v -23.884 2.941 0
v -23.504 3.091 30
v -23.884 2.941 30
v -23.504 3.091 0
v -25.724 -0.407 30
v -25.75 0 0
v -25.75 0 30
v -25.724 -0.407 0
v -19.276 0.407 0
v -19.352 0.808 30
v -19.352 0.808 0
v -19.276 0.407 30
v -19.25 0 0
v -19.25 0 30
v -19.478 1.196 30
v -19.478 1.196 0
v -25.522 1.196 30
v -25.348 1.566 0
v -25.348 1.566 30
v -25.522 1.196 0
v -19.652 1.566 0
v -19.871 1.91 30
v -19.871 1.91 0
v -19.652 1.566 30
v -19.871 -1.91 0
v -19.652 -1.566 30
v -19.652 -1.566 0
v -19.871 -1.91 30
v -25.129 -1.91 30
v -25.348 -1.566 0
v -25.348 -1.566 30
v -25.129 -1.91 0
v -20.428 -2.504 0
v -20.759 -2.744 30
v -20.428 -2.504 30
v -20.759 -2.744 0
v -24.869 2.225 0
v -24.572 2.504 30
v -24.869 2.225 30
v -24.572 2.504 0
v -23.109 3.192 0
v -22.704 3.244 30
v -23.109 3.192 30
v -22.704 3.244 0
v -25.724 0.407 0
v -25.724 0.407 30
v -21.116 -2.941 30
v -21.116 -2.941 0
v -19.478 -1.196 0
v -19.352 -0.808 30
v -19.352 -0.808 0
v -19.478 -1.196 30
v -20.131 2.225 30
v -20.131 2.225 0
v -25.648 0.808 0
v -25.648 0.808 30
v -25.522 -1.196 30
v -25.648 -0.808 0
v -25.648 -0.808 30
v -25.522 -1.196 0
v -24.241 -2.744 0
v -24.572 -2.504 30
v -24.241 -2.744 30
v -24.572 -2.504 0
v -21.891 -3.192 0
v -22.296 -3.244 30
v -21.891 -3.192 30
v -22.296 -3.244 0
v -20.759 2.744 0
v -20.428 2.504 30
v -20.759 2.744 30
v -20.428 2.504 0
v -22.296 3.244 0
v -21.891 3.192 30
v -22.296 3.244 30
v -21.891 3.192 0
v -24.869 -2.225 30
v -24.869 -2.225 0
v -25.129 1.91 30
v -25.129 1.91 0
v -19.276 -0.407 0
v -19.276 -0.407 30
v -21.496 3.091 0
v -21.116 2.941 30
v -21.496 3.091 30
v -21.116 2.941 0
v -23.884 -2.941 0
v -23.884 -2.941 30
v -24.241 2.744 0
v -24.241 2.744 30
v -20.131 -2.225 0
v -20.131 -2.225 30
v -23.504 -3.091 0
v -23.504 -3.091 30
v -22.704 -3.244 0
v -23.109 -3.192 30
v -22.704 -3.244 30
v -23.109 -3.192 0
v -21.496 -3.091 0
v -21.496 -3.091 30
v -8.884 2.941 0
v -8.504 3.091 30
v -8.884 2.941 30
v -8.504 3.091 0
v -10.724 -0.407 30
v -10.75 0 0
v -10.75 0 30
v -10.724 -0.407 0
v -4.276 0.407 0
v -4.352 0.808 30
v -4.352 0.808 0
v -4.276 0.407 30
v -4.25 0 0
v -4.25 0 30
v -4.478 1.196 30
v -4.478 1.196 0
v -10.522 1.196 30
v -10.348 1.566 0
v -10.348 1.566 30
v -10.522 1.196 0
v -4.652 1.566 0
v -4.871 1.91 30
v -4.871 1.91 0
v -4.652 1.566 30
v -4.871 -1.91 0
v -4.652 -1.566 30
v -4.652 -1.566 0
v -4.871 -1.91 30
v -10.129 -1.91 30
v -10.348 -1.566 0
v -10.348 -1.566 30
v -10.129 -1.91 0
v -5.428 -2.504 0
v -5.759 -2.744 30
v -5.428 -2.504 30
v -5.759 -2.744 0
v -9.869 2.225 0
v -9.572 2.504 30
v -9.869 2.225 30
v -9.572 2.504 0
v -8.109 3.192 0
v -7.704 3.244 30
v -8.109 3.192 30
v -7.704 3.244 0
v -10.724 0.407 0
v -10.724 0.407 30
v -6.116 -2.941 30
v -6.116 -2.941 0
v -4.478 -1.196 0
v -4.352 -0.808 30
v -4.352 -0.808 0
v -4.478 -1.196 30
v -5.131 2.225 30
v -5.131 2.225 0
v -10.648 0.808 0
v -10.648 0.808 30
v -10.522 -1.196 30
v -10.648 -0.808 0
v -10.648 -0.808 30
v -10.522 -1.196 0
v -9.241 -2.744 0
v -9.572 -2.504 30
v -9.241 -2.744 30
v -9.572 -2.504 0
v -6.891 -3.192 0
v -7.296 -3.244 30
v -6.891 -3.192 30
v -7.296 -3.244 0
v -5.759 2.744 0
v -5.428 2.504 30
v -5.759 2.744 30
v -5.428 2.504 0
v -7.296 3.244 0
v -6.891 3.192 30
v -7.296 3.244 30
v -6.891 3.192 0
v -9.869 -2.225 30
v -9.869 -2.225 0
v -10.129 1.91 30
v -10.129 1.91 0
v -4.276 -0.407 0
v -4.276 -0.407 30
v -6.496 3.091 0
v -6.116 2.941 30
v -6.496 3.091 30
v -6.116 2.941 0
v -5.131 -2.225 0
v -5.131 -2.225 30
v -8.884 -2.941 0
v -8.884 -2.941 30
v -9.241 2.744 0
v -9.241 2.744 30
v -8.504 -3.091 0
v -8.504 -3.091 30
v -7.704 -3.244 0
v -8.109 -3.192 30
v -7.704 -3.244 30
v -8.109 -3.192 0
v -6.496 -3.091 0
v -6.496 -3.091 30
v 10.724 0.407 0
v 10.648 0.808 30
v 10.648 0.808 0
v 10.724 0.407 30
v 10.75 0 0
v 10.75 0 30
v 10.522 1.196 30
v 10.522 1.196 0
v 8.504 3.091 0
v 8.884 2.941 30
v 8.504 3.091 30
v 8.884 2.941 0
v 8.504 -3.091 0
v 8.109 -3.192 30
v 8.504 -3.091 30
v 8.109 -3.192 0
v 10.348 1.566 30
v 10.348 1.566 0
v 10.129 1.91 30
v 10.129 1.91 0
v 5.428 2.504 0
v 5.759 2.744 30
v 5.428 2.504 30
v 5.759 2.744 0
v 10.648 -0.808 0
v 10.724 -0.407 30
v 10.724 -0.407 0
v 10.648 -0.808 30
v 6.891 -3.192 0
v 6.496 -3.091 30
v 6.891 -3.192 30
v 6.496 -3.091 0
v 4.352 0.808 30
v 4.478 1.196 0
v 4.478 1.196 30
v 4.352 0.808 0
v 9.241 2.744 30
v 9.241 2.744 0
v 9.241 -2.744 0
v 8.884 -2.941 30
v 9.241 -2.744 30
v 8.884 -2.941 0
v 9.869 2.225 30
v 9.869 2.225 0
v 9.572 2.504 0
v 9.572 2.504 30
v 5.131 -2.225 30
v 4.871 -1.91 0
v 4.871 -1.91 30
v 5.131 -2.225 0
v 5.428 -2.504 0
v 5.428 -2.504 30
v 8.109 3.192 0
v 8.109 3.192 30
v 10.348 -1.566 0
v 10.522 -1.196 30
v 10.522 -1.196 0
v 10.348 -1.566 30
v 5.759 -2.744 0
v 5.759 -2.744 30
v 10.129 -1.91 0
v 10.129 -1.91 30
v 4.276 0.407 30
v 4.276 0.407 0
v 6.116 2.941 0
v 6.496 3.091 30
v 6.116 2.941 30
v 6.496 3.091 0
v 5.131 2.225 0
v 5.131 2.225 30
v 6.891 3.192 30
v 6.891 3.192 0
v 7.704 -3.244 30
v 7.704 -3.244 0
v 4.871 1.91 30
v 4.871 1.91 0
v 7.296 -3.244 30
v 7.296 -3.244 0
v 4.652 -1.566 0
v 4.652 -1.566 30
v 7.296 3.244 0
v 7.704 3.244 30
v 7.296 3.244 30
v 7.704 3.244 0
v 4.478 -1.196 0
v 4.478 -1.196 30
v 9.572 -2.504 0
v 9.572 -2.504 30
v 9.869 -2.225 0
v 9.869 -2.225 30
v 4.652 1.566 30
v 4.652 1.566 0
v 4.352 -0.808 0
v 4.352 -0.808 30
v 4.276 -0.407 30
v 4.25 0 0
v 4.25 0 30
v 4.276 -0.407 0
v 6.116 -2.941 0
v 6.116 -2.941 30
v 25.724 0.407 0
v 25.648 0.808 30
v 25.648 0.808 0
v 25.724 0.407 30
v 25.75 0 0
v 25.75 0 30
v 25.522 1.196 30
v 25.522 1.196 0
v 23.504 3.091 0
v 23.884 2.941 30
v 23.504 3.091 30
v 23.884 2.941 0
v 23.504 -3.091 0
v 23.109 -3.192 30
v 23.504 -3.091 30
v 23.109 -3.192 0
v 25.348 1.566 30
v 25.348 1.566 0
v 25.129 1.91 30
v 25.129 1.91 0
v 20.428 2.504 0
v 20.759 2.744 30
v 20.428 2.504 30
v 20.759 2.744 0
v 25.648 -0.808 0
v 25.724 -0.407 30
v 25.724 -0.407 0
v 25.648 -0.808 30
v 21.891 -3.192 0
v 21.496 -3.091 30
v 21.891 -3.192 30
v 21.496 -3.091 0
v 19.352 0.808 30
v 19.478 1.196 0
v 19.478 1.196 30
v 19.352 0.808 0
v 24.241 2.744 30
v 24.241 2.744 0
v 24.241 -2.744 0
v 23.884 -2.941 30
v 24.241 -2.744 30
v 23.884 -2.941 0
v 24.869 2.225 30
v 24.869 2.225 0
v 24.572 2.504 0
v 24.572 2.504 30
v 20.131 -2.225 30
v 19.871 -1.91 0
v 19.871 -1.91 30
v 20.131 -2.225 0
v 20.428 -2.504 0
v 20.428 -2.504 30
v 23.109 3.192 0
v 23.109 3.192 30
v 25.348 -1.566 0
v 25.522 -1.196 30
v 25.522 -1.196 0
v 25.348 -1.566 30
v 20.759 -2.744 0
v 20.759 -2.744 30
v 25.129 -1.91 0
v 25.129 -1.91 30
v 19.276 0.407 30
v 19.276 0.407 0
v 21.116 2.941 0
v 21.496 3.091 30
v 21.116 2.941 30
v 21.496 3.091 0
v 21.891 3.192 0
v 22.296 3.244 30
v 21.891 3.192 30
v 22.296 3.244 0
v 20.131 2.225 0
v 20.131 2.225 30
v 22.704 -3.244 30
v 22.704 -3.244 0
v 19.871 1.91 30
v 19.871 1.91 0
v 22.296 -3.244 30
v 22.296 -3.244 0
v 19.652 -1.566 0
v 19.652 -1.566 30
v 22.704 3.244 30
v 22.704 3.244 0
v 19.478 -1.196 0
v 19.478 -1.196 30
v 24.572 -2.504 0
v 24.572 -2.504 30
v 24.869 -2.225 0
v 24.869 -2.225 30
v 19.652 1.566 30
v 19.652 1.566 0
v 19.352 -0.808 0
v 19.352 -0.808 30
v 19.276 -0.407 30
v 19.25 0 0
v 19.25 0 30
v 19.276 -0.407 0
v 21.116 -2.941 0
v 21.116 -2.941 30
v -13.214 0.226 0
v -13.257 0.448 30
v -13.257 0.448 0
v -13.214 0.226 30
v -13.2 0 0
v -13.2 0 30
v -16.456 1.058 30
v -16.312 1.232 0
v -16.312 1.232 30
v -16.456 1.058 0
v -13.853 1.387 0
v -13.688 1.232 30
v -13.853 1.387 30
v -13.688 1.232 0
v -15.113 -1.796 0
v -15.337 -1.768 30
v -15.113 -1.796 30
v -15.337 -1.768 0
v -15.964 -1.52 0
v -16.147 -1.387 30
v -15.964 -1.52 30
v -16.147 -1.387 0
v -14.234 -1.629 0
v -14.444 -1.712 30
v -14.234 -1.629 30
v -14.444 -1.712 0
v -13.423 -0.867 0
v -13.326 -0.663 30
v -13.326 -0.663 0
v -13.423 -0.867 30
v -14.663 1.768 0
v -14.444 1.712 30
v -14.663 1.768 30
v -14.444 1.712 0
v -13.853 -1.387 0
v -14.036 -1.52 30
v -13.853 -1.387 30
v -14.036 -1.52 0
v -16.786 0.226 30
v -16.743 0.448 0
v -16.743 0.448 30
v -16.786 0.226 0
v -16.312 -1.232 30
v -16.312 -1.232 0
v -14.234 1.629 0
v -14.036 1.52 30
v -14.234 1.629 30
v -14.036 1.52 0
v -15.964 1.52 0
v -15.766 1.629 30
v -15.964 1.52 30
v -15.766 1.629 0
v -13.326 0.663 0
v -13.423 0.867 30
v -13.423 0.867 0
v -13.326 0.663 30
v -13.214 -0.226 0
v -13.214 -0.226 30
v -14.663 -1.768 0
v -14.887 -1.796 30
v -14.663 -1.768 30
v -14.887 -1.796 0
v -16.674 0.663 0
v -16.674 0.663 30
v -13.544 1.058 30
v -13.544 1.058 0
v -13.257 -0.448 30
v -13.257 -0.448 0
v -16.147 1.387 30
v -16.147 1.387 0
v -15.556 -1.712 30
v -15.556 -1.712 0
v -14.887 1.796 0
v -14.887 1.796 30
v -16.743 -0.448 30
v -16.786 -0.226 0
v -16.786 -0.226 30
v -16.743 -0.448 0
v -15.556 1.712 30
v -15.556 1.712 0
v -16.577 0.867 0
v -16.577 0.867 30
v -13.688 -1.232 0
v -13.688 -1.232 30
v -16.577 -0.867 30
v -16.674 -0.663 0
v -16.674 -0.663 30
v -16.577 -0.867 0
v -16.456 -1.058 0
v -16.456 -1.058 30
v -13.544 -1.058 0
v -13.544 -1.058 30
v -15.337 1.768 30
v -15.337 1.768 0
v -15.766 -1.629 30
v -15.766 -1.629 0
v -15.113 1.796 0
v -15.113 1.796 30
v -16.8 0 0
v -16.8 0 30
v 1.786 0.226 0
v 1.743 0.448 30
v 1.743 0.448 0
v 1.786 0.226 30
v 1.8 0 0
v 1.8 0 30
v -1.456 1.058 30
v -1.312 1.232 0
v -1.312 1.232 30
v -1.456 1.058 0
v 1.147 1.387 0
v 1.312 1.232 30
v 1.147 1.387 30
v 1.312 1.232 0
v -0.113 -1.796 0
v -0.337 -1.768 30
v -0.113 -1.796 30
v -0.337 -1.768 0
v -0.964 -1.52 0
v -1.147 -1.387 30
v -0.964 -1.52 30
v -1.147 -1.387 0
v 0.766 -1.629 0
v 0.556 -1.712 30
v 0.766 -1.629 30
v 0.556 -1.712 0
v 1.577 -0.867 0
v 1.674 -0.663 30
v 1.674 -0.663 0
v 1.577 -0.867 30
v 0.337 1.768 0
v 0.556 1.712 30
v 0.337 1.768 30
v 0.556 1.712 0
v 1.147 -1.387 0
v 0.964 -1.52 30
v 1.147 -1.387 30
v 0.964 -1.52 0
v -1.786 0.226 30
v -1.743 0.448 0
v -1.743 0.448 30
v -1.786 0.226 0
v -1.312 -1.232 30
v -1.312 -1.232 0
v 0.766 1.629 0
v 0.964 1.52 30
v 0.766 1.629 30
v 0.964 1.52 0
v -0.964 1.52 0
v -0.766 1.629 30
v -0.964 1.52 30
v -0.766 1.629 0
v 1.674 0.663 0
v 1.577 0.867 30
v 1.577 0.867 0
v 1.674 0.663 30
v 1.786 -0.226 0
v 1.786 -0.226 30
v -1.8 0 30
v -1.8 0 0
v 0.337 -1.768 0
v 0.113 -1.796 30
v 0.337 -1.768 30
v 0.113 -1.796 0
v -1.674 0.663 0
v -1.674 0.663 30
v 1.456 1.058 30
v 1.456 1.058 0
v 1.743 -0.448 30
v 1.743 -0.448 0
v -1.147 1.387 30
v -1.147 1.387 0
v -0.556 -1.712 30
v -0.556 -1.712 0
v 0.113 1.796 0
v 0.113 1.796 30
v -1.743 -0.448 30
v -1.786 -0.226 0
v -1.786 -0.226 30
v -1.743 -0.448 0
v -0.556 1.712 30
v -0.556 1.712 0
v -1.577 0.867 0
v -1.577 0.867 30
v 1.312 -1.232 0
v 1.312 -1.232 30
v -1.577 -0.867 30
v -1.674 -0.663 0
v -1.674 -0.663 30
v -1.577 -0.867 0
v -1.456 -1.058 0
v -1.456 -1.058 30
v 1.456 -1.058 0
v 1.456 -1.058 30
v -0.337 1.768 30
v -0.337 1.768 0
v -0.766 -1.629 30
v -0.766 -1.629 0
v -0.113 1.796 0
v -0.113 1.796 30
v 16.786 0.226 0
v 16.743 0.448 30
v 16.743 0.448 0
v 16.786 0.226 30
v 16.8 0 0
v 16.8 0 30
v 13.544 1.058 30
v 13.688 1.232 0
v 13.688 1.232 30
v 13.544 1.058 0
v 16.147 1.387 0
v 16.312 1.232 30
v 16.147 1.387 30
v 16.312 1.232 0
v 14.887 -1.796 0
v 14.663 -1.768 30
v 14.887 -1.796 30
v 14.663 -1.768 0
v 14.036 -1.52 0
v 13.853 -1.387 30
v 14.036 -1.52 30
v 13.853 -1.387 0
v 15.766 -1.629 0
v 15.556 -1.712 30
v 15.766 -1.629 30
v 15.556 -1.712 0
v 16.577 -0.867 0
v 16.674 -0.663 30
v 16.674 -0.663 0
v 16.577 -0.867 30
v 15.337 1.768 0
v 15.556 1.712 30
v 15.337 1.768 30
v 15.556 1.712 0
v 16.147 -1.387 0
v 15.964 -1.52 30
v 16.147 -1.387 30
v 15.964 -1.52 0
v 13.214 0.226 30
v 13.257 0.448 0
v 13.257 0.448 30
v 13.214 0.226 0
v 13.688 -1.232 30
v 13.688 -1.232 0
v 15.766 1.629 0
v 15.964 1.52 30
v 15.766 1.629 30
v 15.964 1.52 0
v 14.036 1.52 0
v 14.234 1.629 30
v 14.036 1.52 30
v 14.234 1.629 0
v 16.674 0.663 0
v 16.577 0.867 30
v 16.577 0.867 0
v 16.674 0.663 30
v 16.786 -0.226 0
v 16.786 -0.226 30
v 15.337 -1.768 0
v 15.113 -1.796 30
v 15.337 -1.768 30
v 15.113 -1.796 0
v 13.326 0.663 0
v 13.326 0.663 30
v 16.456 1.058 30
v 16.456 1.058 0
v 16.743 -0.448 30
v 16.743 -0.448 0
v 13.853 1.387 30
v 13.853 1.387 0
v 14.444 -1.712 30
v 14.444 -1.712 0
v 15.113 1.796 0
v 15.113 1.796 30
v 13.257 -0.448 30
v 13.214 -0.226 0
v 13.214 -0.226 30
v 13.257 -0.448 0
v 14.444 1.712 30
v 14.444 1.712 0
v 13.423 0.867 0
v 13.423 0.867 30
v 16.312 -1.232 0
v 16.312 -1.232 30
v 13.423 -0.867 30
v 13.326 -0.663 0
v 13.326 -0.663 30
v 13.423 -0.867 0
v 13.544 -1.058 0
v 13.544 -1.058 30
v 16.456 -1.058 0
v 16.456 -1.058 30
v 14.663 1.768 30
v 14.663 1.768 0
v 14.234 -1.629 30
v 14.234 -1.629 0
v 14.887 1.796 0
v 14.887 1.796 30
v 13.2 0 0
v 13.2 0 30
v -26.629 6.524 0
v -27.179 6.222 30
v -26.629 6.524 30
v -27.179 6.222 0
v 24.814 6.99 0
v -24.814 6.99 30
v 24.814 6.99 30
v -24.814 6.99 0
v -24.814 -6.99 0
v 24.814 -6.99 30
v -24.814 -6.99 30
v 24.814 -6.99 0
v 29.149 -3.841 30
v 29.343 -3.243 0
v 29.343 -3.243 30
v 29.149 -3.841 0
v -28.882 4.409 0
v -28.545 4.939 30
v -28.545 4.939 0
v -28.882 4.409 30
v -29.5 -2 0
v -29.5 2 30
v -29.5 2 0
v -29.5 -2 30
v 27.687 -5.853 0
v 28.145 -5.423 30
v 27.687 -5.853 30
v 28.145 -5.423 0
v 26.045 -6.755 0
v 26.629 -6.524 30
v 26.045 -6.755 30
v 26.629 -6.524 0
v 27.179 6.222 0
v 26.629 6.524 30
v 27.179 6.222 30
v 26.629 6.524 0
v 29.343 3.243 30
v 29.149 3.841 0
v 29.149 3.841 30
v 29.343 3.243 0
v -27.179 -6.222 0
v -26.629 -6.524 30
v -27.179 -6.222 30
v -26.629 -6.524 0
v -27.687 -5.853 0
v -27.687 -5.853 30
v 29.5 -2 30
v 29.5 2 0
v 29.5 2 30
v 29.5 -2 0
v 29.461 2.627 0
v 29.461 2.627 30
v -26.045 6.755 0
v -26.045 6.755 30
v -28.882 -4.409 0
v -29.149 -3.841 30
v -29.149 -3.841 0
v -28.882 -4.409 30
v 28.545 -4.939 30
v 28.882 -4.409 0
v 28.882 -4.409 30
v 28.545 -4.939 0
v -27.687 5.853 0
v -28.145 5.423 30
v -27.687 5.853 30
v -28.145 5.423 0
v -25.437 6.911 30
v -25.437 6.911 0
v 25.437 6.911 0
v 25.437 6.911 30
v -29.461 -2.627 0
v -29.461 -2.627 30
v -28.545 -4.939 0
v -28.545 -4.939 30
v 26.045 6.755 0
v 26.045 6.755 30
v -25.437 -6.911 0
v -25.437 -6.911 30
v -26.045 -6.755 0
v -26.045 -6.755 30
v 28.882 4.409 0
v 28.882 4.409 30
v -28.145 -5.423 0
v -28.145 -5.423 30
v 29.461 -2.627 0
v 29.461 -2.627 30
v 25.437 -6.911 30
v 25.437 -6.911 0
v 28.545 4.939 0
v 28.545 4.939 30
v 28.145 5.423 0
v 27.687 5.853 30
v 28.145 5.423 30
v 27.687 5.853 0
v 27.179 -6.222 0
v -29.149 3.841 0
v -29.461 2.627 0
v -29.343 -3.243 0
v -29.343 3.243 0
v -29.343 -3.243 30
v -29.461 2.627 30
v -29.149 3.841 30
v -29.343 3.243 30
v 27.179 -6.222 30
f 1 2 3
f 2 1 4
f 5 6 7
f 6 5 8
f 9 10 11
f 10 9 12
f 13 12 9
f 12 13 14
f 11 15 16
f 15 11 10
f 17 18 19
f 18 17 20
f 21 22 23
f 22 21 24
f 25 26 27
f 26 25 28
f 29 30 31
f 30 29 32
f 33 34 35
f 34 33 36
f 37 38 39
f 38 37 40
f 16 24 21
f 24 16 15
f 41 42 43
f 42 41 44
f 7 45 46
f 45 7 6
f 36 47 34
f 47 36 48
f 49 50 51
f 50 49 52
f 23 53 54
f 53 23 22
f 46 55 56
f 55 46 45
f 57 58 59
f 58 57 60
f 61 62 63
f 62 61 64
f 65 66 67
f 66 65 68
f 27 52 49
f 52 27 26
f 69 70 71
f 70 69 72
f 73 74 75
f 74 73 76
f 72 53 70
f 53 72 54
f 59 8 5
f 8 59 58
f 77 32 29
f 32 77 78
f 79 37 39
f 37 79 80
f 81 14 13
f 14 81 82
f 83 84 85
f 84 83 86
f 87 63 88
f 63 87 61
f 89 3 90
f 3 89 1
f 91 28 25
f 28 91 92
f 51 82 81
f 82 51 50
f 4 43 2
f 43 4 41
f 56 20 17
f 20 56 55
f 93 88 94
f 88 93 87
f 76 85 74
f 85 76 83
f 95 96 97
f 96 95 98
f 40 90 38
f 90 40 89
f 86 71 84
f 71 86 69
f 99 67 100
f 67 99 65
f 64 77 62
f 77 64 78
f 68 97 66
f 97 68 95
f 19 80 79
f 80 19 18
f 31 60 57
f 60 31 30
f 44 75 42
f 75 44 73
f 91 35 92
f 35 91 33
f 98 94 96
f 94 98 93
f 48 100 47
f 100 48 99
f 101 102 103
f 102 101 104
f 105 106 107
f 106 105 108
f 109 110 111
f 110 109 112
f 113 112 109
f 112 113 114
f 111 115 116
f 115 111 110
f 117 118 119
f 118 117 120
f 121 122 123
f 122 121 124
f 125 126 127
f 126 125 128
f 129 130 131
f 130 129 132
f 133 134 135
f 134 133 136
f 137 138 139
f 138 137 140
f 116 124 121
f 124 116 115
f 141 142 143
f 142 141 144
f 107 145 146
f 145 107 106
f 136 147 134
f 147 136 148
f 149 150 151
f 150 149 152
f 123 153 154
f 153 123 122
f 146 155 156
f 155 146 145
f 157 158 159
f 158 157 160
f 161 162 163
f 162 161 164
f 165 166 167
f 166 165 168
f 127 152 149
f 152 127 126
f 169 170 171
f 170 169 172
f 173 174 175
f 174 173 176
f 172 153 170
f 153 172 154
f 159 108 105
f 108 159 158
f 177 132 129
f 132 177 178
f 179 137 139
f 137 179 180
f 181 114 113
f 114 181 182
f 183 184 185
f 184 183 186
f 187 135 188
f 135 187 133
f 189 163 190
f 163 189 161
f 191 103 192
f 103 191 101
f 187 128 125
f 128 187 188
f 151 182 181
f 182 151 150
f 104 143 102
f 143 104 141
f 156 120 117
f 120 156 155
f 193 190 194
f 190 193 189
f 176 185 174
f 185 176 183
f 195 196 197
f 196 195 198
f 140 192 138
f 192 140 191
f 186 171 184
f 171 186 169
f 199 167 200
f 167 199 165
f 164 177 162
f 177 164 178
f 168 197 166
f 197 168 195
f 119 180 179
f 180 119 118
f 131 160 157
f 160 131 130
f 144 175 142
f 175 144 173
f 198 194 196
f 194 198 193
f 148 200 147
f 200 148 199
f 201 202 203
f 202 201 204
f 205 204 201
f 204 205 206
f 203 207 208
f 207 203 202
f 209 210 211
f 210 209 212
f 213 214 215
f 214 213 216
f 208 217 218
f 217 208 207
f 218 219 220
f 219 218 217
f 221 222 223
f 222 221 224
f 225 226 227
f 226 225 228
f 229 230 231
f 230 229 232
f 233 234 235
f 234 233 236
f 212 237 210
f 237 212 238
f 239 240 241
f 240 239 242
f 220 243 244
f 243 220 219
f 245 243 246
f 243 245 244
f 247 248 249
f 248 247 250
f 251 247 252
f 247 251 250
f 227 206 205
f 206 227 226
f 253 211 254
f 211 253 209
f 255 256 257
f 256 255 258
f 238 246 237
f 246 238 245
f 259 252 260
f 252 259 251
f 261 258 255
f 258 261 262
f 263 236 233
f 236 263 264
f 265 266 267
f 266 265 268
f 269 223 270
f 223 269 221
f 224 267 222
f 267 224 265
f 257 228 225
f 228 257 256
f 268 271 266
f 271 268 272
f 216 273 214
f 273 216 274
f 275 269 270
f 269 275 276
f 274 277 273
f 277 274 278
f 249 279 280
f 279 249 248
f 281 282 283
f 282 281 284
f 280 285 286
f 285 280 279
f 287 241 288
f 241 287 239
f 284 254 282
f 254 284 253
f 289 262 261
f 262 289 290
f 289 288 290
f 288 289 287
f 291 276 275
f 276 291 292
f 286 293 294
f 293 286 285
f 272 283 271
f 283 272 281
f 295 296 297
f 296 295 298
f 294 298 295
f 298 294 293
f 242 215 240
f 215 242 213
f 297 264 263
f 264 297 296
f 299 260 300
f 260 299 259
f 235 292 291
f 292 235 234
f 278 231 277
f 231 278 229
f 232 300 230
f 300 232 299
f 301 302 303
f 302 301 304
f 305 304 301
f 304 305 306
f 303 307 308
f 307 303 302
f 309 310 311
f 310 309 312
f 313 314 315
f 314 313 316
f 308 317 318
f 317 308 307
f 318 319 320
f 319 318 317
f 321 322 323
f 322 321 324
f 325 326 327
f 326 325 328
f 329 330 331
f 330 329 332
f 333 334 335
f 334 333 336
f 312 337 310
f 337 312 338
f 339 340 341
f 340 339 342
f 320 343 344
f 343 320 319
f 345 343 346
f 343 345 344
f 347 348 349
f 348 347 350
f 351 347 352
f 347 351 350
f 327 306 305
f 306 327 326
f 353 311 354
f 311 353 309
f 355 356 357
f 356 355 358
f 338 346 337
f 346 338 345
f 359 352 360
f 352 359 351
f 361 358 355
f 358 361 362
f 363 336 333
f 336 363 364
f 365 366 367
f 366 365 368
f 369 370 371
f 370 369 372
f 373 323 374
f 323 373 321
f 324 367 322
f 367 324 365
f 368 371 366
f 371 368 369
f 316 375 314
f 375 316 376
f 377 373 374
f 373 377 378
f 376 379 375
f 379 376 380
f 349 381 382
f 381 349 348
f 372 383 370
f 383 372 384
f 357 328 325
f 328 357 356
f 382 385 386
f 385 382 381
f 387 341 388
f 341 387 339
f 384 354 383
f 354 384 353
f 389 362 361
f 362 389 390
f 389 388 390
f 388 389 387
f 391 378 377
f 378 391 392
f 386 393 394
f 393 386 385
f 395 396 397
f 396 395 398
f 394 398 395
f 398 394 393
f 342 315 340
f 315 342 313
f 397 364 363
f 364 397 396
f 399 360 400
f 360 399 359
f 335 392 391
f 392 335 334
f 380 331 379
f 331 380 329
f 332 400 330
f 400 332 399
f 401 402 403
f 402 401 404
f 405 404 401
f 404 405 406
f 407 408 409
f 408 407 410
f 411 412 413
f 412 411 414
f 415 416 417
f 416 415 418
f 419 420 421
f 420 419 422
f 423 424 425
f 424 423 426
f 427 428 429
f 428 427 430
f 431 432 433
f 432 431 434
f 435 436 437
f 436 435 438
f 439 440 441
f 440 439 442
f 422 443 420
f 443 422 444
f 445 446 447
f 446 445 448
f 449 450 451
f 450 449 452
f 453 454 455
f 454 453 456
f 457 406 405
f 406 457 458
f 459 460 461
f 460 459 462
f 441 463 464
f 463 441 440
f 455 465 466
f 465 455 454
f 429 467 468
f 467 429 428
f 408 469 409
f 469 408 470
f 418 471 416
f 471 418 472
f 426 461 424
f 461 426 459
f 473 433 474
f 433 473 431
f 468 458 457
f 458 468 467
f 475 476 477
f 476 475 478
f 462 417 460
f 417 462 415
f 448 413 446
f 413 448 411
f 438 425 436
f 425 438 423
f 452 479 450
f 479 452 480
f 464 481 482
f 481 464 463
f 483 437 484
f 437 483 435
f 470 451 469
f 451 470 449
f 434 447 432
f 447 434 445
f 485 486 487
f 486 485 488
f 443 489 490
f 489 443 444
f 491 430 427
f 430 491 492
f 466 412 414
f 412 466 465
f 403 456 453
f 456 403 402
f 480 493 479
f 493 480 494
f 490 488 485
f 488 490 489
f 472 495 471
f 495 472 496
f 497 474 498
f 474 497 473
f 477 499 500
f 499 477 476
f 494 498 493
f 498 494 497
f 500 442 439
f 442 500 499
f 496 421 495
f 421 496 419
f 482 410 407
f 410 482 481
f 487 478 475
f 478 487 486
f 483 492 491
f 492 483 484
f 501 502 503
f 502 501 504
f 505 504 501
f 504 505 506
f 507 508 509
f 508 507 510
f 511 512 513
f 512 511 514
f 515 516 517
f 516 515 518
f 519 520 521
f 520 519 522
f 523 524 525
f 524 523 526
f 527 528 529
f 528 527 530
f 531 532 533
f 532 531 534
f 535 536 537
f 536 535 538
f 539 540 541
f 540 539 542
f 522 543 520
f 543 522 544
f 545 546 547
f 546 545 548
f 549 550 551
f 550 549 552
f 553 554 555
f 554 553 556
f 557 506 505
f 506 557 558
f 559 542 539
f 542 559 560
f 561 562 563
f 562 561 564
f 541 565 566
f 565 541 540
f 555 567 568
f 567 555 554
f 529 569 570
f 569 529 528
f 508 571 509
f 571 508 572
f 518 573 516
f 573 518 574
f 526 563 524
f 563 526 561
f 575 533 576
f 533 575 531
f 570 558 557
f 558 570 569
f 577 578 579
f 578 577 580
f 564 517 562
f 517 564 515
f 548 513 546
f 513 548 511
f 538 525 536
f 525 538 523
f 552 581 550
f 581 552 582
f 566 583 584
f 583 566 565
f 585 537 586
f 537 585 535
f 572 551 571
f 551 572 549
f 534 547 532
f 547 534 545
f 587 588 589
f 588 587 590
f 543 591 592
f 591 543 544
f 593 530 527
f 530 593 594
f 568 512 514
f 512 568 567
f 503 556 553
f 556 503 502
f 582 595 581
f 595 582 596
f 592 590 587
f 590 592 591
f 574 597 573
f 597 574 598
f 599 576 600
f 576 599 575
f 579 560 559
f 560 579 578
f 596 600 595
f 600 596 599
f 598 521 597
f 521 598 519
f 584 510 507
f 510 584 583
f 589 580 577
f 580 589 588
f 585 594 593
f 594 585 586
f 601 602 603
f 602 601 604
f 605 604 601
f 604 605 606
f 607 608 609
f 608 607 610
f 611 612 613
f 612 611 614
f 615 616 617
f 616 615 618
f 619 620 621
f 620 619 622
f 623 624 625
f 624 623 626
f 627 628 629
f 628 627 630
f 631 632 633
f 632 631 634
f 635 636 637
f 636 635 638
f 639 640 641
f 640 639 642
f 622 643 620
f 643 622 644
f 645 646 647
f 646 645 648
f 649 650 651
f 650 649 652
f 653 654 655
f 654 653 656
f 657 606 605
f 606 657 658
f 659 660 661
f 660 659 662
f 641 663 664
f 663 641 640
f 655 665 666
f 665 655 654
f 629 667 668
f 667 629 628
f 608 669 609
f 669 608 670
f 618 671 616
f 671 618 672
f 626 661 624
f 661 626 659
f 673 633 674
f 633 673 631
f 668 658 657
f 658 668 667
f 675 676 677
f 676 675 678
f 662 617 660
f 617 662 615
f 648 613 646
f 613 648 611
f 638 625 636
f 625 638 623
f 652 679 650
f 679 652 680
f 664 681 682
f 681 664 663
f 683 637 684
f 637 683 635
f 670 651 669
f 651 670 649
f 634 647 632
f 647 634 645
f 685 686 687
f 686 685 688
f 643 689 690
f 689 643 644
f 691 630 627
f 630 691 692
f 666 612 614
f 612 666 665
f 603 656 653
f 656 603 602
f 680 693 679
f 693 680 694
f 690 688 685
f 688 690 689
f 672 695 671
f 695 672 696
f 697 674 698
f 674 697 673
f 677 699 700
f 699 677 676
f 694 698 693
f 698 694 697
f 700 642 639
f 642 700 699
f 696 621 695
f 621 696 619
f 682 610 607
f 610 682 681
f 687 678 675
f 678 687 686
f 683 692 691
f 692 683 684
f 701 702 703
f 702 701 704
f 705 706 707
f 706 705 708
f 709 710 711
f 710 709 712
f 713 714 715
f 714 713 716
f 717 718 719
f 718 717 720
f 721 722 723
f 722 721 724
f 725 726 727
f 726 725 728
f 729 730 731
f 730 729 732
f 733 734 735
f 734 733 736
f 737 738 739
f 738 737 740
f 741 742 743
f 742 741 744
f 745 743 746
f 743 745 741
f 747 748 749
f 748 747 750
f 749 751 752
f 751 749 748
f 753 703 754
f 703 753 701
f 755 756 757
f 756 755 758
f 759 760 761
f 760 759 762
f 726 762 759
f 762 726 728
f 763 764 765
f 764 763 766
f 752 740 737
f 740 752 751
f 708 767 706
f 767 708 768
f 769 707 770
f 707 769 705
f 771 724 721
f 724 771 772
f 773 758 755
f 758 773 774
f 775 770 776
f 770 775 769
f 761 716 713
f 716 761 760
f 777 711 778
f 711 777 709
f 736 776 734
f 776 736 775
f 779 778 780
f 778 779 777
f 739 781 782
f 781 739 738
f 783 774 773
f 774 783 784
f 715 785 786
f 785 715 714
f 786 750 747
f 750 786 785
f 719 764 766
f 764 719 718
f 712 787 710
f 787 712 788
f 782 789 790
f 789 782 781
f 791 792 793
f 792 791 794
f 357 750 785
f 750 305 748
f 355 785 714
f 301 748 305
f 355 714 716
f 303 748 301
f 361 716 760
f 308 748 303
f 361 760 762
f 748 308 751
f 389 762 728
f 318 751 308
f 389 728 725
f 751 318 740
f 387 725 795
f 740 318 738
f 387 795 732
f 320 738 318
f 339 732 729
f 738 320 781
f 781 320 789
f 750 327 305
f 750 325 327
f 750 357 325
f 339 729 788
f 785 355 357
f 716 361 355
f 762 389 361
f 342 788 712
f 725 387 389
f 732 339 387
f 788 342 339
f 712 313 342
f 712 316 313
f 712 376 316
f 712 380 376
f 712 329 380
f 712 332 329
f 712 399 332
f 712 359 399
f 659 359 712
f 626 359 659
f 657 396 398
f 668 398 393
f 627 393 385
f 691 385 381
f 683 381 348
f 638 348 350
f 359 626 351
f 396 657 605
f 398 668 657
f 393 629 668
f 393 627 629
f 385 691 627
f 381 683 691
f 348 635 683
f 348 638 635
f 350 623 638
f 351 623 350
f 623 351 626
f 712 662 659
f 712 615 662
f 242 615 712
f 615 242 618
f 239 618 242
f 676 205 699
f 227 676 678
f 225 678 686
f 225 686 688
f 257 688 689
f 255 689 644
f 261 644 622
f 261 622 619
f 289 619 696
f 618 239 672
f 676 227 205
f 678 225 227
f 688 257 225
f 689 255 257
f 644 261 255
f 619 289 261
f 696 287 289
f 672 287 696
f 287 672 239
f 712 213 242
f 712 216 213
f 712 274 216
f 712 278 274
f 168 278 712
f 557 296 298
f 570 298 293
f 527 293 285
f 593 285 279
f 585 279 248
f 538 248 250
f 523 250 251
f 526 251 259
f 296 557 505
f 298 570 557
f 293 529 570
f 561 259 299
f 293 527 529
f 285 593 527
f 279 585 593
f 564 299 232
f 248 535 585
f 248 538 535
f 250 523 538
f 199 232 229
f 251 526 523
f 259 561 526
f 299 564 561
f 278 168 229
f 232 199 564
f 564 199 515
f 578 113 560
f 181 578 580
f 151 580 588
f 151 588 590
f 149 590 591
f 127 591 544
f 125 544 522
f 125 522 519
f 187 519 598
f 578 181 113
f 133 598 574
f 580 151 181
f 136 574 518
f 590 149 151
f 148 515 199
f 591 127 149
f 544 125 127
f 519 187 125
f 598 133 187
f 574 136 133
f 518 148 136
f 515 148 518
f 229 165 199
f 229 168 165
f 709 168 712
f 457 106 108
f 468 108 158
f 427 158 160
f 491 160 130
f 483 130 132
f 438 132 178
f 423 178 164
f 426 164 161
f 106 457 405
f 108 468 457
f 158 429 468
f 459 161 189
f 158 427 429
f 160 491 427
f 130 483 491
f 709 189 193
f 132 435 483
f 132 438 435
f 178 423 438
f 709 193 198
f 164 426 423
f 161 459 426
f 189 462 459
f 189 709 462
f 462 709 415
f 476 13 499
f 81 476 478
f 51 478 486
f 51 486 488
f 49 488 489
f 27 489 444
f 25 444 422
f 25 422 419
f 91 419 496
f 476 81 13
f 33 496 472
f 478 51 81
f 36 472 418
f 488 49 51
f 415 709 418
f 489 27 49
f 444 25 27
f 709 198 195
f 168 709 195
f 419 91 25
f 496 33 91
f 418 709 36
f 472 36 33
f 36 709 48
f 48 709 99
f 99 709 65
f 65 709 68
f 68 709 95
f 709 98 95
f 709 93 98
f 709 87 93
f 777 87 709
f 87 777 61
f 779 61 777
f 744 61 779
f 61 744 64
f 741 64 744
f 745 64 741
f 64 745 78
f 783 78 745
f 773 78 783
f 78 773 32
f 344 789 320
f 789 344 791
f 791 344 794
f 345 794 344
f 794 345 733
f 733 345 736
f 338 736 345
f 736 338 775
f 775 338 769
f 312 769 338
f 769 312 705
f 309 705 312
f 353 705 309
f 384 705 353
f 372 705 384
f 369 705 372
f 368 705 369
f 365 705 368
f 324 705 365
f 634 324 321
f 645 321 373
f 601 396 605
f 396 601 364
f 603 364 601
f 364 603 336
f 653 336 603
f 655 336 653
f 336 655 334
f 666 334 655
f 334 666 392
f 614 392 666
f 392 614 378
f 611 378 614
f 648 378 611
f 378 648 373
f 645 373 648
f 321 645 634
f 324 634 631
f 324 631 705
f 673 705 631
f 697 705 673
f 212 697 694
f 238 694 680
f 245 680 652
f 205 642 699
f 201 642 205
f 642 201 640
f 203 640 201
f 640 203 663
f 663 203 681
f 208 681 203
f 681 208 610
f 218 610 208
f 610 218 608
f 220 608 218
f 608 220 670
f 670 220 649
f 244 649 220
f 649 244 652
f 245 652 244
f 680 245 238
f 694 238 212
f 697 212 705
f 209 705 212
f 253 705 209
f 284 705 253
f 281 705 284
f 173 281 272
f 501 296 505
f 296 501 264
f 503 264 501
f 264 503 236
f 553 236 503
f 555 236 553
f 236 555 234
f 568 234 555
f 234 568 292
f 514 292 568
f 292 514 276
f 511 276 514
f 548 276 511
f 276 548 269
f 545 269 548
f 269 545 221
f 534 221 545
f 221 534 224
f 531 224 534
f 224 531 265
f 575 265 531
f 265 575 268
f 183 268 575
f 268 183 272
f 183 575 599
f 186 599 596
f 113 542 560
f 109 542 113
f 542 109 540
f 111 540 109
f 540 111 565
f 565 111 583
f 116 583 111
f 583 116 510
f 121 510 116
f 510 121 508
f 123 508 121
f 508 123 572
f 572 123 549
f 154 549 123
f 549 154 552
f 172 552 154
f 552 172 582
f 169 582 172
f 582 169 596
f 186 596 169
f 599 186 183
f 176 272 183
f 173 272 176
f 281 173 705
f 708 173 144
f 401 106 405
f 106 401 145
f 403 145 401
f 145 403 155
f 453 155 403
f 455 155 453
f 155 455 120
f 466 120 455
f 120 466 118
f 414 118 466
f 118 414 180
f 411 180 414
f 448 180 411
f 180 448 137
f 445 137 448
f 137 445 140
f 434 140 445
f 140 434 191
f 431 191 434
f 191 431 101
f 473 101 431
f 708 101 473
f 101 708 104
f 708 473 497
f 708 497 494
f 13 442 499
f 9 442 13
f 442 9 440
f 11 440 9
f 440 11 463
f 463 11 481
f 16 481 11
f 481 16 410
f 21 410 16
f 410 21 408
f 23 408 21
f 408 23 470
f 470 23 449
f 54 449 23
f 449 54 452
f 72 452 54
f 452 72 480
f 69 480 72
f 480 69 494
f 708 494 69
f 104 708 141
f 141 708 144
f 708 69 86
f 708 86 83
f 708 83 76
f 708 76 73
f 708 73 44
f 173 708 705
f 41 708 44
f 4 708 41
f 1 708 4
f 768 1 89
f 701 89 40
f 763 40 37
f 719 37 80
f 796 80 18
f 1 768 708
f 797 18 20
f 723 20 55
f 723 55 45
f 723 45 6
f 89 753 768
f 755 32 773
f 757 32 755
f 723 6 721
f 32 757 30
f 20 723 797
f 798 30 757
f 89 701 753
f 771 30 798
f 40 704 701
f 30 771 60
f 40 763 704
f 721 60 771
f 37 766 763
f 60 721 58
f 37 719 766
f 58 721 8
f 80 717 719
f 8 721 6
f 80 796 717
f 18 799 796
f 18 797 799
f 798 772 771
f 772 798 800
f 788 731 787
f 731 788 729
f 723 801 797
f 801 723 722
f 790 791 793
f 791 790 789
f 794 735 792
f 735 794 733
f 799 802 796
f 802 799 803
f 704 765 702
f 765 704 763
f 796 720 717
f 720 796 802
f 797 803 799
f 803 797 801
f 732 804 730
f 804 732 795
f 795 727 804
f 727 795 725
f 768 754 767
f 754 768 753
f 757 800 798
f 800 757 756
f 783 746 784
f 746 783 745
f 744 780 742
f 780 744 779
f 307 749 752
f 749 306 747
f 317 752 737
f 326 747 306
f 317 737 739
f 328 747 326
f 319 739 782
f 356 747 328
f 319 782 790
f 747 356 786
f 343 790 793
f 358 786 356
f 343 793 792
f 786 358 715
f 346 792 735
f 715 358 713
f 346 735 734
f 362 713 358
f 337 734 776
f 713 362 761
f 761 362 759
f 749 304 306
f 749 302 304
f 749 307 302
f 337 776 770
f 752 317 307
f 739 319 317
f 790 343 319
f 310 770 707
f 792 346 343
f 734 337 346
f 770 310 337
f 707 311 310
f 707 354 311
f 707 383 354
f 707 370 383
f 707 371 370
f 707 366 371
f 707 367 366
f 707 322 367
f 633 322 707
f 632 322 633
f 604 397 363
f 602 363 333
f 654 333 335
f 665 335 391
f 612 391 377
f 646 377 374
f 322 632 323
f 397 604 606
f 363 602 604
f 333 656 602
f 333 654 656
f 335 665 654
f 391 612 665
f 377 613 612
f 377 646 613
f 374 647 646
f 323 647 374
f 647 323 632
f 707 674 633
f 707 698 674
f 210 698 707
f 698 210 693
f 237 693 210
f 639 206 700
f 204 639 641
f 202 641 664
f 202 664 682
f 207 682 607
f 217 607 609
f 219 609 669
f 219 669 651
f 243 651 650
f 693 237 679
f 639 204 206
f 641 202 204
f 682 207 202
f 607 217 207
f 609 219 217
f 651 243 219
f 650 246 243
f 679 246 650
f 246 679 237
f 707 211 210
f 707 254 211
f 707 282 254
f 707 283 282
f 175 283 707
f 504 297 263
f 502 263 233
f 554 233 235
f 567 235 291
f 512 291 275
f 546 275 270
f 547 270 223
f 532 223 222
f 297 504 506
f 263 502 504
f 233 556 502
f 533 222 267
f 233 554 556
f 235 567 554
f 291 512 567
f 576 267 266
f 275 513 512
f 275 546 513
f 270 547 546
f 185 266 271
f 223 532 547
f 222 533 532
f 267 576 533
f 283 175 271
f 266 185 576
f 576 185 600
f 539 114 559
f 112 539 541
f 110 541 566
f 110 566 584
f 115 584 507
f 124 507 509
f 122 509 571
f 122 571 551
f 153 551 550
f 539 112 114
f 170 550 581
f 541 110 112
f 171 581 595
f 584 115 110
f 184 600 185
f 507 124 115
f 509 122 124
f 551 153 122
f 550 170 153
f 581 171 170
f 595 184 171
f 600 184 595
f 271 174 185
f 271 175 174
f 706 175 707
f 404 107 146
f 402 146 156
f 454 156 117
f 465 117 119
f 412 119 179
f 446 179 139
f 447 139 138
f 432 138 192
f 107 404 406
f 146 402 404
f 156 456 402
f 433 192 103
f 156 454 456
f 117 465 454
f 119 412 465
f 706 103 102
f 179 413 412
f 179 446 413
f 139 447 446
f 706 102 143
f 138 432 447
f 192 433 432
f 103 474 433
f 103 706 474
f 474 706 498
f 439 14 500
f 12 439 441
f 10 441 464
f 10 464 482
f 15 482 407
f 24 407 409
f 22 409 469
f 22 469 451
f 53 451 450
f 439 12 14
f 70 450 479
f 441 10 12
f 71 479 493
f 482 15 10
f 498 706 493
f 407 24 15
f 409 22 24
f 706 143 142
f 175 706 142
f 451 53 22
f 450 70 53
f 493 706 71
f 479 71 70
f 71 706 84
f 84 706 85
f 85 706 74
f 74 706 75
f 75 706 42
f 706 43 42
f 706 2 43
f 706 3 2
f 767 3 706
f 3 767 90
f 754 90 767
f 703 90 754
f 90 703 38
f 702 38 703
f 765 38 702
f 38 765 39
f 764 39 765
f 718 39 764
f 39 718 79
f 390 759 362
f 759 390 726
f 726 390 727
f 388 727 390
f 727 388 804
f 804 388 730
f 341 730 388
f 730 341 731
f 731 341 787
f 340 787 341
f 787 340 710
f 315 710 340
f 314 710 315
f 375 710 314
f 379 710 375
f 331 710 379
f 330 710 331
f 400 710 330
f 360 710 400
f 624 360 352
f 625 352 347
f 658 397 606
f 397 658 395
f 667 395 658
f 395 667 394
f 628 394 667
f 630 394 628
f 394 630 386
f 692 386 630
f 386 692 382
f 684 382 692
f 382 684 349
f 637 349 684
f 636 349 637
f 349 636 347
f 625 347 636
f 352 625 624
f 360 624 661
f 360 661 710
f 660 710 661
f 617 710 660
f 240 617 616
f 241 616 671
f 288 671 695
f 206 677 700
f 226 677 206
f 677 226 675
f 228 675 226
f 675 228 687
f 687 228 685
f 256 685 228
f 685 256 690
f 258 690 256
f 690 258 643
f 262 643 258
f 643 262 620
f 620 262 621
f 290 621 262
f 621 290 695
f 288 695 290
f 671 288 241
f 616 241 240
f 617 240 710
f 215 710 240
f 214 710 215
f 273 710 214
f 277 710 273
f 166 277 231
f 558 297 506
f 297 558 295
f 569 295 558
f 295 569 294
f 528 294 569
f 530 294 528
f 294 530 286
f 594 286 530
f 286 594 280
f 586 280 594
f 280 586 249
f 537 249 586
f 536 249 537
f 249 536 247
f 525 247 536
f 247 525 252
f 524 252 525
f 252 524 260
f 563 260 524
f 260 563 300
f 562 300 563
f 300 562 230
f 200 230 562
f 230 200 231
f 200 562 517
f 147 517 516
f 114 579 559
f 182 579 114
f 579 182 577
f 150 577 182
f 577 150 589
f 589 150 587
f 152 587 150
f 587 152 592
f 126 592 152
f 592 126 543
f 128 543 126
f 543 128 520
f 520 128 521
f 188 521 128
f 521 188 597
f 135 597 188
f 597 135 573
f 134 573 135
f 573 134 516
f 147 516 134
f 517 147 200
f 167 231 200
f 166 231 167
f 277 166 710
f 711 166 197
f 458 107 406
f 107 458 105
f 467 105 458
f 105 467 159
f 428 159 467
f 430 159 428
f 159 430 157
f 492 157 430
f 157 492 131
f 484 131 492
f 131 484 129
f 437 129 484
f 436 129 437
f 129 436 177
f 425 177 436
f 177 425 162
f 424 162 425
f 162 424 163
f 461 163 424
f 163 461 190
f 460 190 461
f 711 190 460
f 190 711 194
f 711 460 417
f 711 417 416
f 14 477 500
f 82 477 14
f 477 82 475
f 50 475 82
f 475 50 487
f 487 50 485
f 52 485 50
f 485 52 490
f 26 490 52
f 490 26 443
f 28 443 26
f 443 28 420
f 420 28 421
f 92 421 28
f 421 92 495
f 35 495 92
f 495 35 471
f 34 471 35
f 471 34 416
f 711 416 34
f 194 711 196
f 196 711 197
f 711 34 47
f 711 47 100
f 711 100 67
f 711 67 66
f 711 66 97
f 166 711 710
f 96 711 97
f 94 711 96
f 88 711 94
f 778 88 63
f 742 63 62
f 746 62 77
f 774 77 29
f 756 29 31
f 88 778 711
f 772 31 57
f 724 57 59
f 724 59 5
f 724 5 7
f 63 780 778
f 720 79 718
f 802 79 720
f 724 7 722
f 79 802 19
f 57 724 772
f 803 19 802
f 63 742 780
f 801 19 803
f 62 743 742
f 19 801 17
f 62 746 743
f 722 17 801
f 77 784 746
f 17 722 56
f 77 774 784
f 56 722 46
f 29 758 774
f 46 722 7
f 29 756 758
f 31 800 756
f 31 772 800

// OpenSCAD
$fn = 50;


difference() {
	union() {
		*color(alpha = 1.0000000000, c = "gray") {
			translate(v = [0, 7, 0]) {
				linear_extrude(height = 1) {
					text(font = "Arial:style=Bold", halign = "center", size = 4.5000000000, text = "COMMENT plate main", valign = "center");
				}
			}
		}
		*color(alpha = 1.0000000000, c = "gray") {
			translate(v = [0, 14, 0]) {
				linear_extrude(height = 1) {
					text(font = "Arial:style=Bold", halign = "center", size = 4.5000000000, text = "COMMENT description oobb_plate_shape_p_type_30_depth_4_width_1_height_30_thickness_true_both_holes", valign = "center");
				}
			}
		}
		hull() {
			translate(v = [-24.5000000000, 2.0000000000, 0]) {
				cylinder(h = 30, r = 5);
			}
			translate(v = [24.5000000000, 2.0000000000, 0]) {
				cylinder(h = 30, r = 5);
			}
			translate(v = [-24.5000000000, -2.0000000000, 0]) {
				cylinder(h = 30, r = 5);
			}
			translate(v = [24.5000000000, -2.0000000000, 0]) {
				cylinder(h = 30, r = 5);
			}
		}
	}
	union() {
		*color(alpha = 1.0000000000, c = "gray") {
			translate(v = [0, 7, 0]) {
				linear_extrude(height = 1) {
					text(font = "Arial:style=Bold", halign = "center", size = 4.5000000000, text = "COMMENT holes main", valign = "center");
				}
			}
		}
		*color(alpha = 1.0000000000, c = "gray") {
			translate(v = [0, 14, 0]) {
				linear_extrude(height = 1) {
					text(font = "Arial:style=Bold", halign = "center", size = 4.5000000000, text = "COMMENT description oobb_holes_shape_n_type_4_width_1_height_30_thickness_true_both_holes", valign = "center");
				}
			}
		}
		translate(v = [-22.5000000000, 0.0000000000, 0]) {
			translate(v = [0, 0, -50]) {
				cylinder(h = 100, r = 3.2500000000);
			}
		}
		translate(v = [-7.5000000000, 0.0000000000, 0]) {
			translate(v = [0, 0, -50]) {
				cylinder(h = 100, r = 3.2500000000);
			}
		}
		translate(v = [7.5000000000, 0.0000000000, 0]) {
			translate(v = [0, 0, -50]) {
				cylinder(h = 100, r = 3.2500000000);
			}
		}
		translate(v = [22.5000000000, 0.0000000000, 0]) {
			translate(v = [0, 0, -50]) {
				cylinder(h = 100, r = 3.2500000000);
			}
		}
		translate(v = [-22.5000000000, 0.0000000000, 0]) {
			translate(v = [0, 0, -50]) {
				cylinder(h = 100, r = 1.8000000000);
			}
		}
		translate(v = [-15.0000000000, 0.0000000000, 0]) {
			translate(v = [0, 0, -50]) {
				cylinder(h = 100, r = 1.8000000000);
			}
		}
		translate(v = [-7.5000000000, 0.0000000000, 0]) {
			translate(v = [0, 0, -50]) {
				cylinder(h = 100, r = 1.8000000000);
			}
		}
		translate(v = [0, 0, -50]) {
			cylinder(h = 100, r = 1.8000000000);
		}
		translate(v = [7.5000000000, 0.0000000000, 0]) {
			translate(v = [0, 0, -50]) {
				cylinder(h = 100, r = 1.8000000000);
			}
		}
		translate(v = [15.0000000000, 0.0000000000, 0]) {
			translate(v = [0, 0, -50]) {
				cylinder(h = 100, r = 1.8000000000);
			}
		}
		translate(v = [22.5000000000, 0.0000000000, 0]) {
			translate(v = [0, 0, -50]) {
				cylinder(h = 100, r = 1.8000000000);
			}
		}
	}
}
